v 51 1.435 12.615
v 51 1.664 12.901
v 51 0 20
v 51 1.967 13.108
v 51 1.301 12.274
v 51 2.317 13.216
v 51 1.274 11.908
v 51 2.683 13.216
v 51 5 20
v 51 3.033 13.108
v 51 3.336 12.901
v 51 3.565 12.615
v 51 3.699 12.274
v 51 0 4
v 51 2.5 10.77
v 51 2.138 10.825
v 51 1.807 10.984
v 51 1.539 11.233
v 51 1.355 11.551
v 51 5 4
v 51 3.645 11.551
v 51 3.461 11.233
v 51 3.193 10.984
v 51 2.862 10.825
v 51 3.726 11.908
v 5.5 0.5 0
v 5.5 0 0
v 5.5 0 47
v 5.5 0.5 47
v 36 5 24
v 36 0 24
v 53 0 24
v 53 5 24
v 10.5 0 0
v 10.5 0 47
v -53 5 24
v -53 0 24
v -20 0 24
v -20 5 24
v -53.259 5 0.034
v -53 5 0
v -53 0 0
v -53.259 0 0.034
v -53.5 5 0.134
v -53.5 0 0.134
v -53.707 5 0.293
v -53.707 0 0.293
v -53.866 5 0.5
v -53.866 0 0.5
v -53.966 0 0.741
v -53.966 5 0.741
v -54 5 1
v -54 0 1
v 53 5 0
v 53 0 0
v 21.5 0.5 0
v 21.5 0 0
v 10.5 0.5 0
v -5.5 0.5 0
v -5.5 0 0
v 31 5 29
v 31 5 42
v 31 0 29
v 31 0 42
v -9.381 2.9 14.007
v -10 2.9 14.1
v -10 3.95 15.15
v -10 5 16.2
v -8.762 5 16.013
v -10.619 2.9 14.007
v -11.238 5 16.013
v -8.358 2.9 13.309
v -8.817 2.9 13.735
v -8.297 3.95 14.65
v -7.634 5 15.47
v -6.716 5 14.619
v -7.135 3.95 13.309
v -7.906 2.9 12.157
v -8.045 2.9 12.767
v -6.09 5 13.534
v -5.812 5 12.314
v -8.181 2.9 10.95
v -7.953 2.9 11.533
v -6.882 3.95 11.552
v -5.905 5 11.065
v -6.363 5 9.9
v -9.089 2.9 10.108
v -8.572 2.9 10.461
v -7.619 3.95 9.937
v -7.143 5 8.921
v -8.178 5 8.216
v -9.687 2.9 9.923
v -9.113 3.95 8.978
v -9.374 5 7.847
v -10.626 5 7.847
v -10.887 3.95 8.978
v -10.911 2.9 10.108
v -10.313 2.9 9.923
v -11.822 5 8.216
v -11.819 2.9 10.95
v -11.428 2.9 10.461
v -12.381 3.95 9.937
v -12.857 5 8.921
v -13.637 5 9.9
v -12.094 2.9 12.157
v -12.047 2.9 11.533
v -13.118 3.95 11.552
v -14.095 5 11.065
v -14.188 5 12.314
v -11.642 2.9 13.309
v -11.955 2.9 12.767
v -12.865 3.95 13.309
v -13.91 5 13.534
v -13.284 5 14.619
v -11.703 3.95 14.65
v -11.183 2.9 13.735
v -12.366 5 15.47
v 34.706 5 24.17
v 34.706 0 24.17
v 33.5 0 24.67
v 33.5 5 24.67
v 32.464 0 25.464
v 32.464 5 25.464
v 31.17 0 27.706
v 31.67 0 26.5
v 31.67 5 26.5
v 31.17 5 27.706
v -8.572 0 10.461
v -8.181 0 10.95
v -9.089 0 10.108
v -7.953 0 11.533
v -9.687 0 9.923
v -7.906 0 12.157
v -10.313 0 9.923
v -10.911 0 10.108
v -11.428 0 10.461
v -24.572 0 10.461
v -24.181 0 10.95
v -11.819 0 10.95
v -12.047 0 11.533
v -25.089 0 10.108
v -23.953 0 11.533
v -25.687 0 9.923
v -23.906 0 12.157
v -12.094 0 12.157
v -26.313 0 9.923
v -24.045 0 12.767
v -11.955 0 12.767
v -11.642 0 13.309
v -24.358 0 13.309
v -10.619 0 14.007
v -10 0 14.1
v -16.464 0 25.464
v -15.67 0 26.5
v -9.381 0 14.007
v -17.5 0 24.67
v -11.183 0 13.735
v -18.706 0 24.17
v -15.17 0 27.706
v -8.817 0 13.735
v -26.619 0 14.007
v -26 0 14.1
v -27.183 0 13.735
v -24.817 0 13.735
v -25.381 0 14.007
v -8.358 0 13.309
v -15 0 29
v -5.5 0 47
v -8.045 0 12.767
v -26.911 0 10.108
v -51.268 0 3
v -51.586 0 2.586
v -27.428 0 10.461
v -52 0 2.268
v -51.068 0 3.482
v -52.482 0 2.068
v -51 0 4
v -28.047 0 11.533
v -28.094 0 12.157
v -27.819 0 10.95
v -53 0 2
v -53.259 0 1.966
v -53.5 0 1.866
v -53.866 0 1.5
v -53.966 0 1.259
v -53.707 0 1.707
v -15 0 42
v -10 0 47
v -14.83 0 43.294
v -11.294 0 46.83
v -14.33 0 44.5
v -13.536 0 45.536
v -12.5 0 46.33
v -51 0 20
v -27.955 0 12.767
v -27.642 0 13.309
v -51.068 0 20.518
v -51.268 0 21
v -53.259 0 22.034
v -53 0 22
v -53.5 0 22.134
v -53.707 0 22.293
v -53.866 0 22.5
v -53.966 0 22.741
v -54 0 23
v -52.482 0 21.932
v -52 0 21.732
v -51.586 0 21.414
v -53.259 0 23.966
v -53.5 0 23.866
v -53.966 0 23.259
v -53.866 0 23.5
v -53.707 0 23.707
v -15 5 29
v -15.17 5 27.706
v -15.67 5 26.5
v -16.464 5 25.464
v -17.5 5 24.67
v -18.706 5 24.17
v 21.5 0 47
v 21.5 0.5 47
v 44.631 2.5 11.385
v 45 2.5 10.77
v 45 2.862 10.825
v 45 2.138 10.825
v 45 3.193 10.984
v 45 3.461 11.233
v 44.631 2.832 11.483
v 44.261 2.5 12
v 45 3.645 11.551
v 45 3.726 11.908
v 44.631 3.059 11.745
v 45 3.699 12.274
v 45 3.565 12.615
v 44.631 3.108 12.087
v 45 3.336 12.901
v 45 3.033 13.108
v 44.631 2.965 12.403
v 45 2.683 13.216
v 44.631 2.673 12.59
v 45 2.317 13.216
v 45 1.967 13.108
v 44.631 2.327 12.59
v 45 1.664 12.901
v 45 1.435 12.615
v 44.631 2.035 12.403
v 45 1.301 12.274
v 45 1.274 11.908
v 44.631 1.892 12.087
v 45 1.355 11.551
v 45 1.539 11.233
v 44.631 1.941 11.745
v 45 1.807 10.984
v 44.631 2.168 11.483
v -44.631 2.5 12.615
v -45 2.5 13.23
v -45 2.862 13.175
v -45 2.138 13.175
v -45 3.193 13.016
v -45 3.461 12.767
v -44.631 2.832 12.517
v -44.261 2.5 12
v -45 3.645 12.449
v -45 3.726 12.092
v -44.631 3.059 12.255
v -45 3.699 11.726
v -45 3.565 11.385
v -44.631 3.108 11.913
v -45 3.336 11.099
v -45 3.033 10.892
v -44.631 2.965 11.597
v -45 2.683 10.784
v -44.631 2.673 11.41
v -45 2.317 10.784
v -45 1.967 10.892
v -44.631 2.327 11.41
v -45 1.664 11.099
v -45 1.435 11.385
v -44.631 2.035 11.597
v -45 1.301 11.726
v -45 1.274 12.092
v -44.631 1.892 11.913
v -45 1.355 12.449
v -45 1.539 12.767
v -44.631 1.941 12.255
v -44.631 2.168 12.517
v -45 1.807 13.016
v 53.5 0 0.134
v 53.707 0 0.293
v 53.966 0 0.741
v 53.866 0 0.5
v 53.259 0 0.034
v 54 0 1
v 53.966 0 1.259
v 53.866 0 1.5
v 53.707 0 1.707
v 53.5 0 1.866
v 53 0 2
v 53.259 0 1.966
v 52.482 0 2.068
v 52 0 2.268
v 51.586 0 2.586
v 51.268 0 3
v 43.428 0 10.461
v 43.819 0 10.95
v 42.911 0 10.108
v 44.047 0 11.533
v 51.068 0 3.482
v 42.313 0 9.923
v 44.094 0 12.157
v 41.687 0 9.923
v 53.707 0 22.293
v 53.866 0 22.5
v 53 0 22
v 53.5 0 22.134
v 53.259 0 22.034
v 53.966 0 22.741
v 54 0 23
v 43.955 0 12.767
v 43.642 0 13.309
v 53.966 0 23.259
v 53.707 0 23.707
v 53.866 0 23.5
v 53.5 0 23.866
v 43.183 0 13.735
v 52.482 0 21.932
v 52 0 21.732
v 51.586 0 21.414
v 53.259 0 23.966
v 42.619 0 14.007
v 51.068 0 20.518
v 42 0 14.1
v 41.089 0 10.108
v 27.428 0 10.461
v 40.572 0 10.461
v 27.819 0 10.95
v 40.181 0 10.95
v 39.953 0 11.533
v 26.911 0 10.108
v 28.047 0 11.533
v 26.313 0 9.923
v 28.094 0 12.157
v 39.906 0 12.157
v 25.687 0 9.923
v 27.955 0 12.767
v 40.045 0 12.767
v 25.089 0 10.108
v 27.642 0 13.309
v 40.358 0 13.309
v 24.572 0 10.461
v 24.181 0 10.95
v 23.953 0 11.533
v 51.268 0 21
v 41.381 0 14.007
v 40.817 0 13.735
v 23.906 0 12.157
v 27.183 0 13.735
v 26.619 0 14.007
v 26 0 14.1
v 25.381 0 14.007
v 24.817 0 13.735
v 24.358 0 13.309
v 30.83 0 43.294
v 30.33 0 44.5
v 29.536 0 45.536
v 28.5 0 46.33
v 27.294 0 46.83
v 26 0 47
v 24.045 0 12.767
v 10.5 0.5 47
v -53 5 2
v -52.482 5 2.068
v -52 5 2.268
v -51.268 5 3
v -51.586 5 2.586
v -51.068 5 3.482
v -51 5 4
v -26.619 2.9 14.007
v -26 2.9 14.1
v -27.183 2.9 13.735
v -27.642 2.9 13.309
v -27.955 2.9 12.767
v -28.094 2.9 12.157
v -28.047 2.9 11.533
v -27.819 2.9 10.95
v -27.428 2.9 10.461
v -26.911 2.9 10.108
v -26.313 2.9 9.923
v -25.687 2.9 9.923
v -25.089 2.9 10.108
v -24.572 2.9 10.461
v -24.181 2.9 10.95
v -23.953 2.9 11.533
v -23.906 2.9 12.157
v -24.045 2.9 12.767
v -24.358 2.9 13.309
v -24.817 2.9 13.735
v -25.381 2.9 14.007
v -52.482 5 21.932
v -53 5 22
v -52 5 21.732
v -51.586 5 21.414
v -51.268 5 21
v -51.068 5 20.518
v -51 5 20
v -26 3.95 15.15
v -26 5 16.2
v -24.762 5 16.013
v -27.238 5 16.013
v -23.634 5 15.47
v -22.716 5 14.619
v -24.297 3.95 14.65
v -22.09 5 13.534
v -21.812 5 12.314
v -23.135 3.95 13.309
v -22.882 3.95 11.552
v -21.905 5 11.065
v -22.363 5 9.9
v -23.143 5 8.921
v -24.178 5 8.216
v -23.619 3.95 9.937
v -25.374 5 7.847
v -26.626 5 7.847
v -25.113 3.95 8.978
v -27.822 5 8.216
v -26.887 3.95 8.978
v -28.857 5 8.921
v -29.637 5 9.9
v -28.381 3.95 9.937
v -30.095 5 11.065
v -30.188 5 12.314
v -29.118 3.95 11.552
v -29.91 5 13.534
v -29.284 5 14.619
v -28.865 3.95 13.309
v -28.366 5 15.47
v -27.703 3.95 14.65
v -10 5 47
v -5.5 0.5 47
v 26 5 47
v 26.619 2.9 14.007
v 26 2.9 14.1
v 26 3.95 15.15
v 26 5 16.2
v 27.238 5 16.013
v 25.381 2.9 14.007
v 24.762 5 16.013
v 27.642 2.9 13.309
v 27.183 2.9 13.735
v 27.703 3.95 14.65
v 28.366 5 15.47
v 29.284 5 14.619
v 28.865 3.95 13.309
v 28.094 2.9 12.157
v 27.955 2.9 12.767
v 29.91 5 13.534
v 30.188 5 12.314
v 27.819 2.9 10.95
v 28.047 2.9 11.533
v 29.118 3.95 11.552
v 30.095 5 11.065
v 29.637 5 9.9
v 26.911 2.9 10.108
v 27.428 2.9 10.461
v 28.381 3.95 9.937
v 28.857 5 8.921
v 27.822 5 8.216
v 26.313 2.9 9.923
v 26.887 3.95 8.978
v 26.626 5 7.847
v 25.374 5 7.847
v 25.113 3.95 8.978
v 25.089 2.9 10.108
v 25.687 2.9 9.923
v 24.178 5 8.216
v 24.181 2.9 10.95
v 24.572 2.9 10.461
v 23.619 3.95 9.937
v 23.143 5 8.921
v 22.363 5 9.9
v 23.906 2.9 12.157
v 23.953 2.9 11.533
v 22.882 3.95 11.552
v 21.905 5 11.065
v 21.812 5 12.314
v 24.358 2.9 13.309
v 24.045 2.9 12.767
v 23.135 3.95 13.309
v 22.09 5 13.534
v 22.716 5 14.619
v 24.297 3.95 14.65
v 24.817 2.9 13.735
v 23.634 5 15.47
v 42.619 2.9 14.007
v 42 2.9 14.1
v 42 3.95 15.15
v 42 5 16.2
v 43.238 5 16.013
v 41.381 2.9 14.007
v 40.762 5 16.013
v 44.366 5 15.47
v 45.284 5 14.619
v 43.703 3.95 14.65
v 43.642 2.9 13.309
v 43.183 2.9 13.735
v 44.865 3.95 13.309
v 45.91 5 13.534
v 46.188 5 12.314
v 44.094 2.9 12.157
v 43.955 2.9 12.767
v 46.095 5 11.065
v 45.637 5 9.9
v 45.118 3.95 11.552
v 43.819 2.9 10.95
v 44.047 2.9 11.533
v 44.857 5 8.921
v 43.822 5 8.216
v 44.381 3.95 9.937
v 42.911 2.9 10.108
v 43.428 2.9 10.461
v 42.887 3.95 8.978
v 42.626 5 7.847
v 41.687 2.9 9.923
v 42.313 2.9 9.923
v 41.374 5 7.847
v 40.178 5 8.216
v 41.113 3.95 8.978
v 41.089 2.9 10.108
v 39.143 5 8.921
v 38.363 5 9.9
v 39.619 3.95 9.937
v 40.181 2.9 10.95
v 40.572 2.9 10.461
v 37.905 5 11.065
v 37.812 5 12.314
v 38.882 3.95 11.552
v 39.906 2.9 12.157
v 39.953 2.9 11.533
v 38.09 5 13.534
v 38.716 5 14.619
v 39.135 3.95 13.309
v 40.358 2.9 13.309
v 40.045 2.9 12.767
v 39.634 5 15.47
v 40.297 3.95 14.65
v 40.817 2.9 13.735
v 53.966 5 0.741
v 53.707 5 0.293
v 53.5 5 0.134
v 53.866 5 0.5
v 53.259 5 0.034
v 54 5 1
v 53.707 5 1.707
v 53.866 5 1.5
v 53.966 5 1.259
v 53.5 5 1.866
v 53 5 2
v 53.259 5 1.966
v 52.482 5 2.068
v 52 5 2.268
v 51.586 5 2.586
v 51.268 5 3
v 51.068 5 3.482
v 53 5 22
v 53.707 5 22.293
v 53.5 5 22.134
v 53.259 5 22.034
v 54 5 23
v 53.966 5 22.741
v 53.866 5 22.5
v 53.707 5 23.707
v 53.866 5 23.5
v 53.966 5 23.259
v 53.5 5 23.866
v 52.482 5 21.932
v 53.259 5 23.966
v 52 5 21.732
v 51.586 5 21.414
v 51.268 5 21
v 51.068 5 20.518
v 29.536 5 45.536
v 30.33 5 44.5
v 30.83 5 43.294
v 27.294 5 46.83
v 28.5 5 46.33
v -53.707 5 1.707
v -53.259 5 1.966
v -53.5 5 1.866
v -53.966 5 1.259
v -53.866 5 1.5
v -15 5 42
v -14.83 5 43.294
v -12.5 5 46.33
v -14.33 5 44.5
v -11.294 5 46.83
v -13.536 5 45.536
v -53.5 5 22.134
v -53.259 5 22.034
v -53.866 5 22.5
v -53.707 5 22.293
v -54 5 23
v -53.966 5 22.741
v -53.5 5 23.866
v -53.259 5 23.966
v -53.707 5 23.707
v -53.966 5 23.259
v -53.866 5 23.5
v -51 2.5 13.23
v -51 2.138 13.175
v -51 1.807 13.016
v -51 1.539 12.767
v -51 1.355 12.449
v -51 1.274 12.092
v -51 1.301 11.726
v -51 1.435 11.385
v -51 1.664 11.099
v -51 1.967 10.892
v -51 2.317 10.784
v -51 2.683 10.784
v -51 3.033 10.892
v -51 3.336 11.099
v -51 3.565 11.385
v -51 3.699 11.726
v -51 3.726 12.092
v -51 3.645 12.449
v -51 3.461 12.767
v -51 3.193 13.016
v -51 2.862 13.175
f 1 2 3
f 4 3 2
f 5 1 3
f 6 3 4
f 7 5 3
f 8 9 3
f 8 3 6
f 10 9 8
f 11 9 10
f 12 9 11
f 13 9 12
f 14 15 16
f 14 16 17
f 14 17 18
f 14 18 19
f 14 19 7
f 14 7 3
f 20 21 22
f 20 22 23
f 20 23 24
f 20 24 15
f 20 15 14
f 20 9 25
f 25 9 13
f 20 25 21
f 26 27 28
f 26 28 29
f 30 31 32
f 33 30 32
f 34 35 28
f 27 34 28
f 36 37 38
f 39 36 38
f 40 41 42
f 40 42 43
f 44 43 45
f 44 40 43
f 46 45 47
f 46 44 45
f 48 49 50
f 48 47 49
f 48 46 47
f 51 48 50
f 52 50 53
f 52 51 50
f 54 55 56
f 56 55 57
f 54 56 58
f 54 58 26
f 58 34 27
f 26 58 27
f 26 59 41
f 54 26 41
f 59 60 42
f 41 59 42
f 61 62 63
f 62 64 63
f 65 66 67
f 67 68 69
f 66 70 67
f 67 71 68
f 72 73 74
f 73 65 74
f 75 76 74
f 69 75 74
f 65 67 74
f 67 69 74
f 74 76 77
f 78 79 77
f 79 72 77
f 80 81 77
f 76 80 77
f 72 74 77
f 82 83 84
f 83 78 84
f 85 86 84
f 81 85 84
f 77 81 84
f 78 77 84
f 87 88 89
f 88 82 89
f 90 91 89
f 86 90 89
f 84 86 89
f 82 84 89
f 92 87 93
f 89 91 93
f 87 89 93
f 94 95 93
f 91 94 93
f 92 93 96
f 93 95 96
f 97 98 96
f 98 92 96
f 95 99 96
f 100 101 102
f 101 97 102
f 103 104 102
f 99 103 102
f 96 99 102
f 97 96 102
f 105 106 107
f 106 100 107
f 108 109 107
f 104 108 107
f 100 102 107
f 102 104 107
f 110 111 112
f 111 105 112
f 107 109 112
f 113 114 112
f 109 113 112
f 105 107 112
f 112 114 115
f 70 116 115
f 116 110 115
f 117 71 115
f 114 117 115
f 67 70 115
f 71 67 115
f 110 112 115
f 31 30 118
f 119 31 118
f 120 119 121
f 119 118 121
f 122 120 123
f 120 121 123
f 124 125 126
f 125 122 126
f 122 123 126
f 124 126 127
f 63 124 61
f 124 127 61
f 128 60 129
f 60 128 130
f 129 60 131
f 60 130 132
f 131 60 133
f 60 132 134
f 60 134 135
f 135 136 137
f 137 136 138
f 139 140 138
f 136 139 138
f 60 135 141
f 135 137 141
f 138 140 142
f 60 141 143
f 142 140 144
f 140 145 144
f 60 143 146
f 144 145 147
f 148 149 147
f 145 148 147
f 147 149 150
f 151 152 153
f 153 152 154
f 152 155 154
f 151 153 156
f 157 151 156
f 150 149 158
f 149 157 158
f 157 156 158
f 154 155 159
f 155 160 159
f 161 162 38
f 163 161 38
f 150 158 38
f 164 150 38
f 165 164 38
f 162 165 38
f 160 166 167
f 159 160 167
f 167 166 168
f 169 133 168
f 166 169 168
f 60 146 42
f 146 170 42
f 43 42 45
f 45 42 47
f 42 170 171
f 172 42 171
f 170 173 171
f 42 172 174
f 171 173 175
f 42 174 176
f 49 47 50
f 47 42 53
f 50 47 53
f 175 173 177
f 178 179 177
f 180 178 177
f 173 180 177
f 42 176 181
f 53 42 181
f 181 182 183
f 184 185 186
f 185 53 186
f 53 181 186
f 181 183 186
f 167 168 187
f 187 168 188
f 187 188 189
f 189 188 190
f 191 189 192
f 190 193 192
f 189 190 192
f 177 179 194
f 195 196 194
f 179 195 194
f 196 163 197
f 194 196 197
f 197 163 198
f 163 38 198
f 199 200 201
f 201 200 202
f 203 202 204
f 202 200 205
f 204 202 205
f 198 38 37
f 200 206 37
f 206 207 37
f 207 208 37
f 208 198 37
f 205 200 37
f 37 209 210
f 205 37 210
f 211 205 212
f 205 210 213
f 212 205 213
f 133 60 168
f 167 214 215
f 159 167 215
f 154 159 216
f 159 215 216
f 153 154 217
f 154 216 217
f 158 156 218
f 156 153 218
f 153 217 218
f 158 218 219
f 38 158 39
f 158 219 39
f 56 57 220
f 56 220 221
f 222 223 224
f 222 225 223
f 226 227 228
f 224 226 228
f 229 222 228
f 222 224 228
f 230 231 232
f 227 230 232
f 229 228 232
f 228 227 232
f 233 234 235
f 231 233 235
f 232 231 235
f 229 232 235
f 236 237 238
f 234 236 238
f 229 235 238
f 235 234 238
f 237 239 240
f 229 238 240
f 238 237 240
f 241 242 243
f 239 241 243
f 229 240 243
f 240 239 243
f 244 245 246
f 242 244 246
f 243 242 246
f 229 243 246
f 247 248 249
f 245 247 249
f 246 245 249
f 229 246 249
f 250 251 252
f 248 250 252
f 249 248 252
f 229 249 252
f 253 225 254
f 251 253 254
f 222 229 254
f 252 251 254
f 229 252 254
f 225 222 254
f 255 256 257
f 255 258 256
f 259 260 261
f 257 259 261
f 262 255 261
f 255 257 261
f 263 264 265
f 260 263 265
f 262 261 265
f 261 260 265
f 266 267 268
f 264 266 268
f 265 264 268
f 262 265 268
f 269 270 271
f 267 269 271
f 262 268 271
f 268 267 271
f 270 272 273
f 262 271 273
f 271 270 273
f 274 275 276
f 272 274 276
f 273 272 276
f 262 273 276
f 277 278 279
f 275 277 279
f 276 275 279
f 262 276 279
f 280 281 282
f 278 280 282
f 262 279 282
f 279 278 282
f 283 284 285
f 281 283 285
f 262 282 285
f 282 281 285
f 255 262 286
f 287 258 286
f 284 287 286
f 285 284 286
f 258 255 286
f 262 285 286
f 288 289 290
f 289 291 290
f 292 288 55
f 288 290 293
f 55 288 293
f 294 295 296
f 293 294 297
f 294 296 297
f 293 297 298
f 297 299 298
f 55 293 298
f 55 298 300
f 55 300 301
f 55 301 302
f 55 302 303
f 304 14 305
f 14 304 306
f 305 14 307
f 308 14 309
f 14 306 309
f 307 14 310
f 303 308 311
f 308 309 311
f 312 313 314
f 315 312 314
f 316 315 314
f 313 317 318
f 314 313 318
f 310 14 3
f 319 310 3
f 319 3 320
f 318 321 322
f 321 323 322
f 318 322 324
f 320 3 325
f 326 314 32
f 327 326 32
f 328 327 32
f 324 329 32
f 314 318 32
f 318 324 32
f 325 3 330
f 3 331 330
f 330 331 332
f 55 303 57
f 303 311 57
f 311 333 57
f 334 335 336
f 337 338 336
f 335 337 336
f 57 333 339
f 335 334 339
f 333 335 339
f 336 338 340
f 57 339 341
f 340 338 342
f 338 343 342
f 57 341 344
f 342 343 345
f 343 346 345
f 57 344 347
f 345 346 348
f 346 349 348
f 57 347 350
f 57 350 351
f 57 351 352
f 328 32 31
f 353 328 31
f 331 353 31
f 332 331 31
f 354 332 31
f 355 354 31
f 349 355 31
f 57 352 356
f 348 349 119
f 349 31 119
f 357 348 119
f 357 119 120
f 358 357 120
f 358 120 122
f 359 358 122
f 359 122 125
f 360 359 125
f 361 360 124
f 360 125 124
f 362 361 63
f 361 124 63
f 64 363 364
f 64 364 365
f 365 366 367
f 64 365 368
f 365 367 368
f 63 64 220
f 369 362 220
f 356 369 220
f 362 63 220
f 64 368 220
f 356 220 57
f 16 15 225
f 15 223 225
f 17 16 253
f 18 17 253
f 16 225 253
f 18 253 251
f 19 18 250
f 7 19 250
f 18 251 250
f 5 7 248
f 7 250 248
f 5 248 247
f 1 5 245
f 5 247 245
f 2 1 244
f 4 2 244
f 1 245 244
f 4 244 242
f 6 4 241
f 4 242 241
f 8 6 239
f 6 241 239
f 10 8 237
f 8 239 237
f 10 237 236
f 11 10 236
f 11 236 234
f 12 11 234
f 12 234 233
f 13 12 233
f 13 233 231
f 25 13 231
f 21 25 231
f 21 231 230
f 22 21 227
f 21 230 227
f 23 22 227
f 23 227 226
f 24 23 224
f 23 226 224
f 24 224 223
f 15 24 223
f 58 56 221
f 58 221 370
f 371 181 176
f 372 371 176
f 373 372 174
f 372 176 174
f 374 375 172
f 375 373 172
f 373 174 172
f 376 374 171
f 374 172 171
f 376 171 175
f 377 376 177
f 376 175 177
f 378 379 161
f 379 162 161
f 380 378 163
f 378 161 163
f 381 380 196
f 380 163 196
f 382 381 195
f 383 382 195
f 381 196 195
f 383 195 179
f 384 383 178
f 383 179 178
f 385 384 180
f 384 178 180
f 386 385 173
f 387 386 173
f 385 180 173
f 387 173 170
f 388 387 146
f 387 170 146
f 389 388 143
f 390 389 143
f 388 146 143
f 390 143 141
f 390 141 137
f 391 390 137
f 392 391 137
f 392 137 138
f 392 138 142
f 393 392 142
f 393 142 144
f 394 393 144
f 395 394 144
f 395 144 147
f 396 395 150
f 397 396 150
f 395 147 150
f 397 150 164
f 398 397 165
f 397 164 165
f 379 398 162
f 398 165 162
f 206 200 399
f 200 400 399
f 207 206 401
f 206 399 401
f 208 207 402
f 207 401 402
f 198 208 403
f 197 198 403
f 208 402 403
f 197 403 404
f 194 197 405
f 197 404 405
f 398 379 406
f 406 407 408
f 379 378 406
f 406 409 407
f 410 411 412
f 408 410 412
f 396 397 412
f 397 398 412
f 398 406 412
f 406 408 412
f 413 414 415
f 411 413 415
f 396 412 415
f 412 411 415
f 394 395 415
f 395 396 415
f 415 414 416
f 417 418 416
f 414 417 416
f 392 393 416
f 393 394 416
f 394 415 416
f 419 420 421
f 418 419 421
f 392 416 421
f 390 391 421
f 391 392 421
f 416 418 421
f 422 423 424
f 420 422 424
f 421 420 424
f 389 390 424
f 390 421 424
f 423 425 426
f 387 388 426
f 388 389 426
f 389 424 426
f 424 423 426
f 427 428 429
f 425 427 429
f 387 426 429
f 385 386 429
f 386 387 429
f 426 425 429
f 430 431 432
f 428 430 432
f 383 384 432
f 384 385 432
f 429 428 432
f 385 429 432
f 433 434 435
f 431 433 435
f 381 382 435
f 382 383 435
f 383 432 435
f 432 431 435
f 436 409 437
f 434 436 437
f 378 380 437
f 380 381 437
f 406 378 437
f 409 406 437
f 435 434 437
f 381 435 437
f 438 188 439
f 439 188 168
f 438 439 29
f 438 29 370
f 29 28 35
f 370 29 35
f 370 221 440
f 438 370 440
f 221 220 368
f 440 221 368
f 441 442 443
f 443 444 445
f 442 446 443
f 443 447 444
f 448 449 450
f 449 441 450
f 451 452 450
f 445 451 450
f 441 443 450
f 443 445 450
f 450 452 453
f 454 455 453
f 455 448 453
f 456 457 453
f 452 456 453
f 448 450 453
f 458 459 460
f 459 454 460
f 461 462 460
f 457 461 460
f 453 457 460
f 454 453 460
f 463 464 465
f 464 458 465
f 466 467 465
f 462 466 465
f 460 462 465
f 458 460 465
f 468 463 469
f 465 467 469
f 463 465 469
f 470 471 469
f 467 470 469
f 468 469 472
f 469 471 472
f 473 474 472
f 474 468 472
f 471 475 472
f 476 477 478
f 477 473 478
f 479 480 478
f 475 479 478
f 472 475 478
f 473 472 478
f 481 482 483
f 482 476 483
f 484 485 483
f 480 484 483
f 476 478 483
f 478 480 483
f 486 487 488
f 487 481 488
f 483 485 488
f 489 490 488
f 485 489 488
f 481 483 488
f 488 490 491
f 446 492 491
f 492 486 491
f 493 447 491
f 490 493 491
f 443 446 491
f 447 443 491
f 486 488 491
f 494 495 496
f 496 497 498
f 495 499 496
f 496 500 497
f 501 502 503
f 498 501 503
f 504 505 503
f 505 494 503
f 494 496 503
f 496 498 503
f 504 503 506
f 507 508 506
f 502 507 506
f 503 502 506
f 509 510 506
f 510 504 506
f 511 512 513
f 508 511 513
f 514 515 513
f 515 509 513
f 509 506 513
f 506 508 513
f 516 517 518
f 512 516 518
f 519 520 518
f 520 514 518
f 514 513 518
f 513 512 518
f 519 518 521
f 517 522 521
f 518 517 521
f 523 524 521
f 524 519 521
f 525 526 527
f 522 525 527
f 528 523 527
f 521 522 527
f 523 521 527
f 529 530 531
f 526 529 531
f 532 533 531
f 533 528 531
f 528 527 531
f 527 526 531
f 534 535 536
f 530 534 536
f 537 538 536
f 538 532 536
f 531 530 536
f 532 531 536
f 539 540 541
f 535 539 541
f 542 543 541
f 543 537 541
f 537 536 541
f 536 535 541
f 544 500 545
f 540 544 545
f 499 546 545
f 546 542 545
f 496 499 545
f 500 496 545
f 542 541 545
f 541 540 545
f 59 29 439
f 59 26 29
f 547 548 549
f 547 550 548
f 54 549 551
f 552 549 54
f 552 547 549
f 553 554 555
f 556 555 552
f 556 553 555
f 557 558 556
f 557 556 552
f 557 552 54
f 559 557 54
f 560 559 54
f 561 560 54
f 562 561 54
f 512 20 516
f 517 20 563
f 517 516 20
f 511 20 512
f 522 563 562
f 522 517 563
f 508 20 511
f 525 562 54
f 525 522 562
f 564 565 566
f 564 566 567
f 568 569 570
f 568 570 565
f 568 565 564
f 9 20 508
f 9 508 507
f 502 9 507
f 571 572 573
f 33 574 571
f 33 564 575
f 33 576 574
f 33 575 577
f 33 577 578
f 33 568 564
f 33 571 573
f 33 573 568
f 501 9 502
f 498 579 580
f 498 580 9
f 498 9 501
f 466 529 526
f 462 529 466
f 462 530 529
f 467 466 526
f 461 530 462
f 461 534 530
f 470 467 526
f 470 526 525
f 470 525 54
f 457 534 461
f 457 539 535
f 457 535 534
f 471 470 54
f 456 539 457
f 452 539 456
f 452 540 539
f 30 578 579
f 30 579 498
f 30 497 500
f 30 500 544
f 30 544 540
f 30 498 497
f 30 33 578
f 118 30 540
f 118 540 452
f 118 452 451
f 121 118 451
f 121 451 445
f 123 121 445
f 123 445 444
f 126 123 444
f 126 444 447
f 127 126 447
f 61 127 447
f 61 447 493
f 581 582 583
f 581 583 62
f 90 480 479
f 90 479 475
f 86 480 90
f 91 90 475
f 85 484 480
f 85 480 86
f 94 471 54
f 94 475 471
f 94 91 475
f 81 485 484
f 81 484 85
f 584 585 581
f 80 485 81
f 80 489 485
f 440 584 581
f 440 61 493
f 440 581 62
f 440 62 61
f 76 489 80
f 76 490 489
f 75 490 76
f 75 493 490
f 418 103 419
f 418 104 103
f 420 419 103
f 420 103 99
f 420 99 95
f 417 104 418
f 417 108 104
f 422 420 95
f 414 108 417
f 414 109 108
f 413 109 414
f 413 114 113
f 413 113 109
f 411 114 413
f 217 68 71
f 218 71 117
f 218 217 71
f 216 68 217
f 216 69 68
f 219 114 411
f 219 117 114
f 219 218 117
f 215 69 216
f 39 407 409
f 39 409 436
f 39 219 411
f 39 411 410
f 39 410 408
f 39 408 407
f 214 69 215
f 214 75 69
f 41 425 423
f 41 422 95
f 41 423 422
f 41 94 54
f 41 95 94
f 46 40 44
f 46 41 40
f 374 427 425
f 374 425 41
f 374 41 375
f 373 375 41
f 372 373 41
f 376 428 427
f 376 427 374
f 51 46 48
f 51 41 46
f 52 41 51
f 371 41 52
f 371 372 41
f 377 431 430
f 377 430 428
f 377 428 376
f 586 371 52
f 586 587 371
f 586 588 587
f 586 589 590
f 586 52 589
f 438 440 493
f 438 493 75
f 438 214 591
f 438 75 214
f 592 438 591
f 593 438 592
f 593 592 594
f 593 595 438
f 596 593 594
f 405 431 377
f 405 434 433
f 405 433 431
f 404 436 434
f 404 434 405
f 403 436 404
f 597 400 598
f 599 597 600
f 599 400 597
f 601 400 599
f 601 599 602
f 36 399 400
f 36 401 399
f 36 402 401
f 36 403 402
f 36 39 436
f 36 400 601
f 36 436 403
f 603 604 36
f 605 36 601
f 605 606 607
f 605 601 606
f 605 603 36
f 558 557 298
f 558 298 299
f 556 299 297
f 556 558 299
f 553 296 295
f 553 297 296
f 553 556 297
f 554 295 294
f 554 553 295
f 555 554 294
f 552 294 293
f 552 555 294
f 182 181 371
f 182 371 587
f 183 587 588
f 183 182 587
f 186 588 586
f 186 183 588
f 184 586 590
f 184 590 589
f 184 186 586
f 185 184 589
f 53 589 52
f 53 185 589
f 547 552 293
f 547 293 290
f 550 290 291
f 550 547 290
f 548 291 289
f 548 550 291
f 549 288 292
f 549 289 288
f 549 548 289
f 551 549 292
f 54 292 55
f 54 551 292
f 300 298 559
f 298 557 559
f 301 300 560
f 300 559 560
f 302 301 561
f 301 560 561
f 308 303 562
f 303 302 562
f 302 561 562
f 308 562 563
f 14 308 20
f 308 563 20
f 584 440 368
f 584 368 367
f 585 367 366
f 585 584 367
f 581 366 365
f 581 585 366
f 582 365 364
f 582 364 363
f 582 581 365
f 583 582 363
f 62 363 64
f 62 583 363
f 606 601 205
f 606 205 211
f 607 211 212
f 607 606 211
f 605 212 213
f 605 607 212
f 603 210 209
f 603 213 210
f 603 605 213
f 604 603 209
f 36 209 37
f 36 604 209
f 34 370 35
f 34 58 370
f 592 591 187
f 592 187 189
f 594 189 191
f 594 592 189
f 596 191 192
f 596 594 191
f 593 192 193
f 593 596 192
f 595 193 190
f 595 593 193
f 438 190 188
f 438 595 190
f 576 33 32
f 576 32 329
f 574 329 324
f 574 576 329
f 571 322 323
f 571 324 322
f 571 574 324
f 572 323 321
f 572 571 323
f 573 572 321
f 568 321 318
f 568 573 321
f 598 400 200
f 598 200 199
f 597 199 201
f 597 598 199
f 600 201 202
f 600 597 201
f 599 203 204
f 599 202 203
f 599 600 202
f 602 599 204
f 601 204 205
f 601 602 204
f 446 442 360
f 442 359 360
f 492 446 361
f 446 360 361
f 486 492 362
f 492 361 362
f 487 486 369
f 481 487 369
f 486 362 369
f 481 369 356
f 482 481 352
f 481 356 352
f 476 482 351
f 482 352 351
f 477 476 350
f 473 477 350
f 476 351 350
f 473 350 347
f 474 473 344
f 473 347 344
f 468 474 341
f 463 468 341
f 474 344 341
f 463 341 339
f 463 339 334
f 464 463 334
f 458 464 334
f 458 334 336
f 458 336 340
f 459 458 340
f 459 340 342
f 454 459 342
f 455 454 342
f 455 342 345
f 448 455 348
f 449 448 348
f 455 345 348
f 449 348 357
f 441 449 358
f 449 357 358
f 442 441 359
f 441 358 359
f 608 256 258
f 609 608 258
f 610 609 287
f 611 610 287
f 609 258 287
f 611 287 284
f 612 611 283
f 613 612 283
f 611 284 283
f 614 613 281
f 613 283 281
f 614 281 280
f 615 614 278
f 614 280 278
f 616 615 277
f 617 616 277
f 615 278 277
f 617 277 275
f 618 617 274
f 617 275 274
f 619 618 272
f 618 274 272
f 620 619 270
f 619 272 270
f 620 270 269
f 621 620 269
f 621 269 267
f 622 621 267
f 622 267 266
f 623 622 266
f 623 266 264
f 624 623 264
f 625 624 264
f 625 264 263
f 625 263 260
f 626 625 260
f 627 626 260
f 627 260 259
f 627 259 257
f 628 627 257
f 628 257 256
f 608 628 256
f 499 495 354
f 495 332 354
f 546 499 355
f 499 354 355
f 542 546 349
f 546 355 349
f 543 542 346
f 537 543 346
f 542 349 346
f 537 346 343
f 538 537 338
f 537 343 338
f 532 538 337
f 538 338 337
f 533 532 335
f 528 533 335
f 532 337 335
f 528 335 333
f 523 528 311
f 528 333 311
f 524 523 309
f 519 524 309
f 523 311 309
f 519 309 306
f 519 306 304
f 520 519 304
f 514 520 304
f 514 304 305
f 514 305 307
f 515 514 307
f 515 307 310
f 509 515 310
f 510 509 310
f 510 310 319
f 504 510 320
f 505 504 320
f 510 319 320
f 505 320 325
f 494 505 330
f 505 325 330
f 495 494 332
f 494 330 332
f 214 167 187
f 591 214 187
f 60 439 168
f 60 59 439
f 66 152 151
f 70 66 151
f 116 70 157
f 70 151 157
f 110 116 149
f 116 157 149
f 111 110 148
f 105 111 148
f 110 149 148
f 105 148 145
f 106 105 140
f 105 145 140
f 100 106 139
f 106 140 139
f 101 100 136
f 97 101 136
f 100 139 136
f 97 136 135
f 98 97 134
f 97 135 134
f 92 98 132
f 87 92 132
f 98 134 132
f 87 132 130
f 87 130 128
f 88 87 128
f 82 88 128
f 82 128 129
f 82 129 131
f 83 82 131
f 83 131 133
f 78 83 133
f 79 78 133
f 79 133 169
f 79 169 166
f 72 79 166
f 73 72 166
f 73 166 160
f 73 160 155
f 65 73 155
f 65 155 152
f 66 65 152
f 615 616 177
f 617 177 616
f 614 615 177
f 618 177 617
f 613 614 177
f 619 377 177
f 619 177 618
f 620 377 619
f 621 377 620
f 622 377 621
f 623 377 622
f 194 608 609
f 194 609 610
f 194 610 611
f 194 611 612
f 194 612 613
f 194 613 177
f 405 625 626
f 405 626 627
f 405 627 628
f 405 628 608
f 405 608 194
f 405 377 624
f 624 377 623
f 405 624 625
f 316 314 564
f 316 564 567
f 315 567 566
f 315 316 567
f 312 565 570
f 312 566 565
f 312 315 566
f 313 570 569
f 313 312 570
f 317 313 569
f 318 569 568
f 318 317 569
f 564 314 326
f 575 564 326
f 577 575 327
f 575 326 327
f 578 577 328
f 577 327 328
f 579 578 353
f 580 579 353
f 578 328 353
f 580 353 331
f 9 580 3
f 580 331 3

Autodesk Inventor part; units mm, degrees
ref_plane "YZ Plane" through (0, 0, 0) normal (1, 0, 0) x (0, 1, 0)
ref_plane "XZ Plane" through (0, 0, 0) normal (0, 1, 0) x (-1, 0, 0)
sketch "Skizze1" plane through (0, 0, 0) normal (0, 1, 0) x (-1, 0, 0)
  line L0 (-54, 0) -> (54, 0)
  line L1 (54, 0) -> (54, 24)
  line L2 (54, 24) -> (15, 24)
  line L3 (15, 24) -> (15, 47)
  line L4 (15, 47) -> (-31, 47)
  line L5 (-31, 47) -> (-31, 24)
  line L6 (-31, 24) -> (-54, 24)
  line L7 (-54, 24) -> (-54, 0)
  point P0 (0, 0)
  point P1 (0, 0)
  dimension "d0" = 108
  dimension "d1" = 24
  dimension "d2" = 39
  dimension "d3" = 23
  dimension "d59" = 23
extrude "Extrusion1" add sketch "Skizze1" along normal blind 5
sketch "Skizze2" plane through (54, 0, 24) normal (1, 0, 0) x (0, 0, -1)
  line L0 (0, 0) -> (24, 0) projected
  line L1 (24, 0) -> (24, 5) projected
  line L2 (0, 5) -> (24, 5) projected
  line L3 (0, 0) -> (0, 5) projected
  line L4 (2, 0) -> (22, 0)
  line L5 (22, 0) -> (22, 5)
  line L6 (22, 5) -> (2, 5)
  line L7 (2, 5) -> (2, 0)
  dimension "d7" = 2
  dimension "d8" = 2
extrude "Extrusion2" cut sketch "Skizze2" against normal blind 3 contours L7 L2 L5 L0
sketch "Skizze3" plane through (-54, 0, 0) normal (-1, 0, 0) x (0, 0, 1)
  line L0 (0, 0) -> (24, 0) projected
  line L1 (24, 0) -> (24, 5) projected
  line L2 (0, 5) -> (24, 5) projected
  line L3 (0, 0) -> (0, 5) projected
  line L4 (2, 0) -> (22, 0)
  line L5 (22, 0) -> (22, 5)
  line L6 (22, 5) -> (2, 5)
  line L7 (2, 5) -> (2, 0)
  dimension "d11" = 2
  dimension "d12" = 2
extrude "Extrusion3" cut sketch "Skizze3" against normal blind 3 contours L7 L2 L5 L0
fillet "Rundung1" radius 1 8 edges at (-54, 2.5, 0) (-54, 2.5, 2) (-54, 2.5, 22) (-54, 2.5, 24) (54, 2.5, 24) (54, 2.5, 22) (54, 2.5, 2) (54, 2.5, 0)
fillet "Rundung2" radius 5 4 edges at (31, 2.5, 24) (31, 2.5, 47) (-15, 2.5, 47) (-15, 2.5, 24)
sketch "Skizze4" plane through (53, 0, 0) normal (0, 0, -1) x (-1, 0, 0)
  line L0 (58.5, -0.5) -> (47.5, -0.5)
  line L1 (47.5, -0.5) -> (47.5, 0.5)
  line L2 (47.5, 0.5) -> (58.5, 0.5)
  line L3 (58.5, 0.5) -> (58.5, -0.5)
  line L4 (58.5, -0.5) -> (47.5, 0.5) construction
  line L5 (47.5, -0.5) -> (58.5, 0.5) construction
  point P0 (53, 0)
  dimension "d17" = 11
  dimension "d18" = 1
extrude "Extrusion4" cut sketch "Skizze4" against normal through all
sketch "Skizze6" plane through (0, 5, 0) normal (0, 1, 0) x (1, 0, 0)
  line L0 (53, 0) -> (-53, 0) projected
  point P0 (0, 0)
  point P1 (-26, -12)
  point P2 (26, -12)
  dimension "d31" = 12
  dimension "d32" = 26
  dimension "d33" = 26
hole "Bohrung2" at (-26, 5, 12) at (26, 5, 12) direction (0, -1, 0) diameter 4.2 end through all countersink diameter 8.4 countersink angle 90
sketch "Skizze7" plane through (51, 0, 24) normal (1, 0, 0) x (0, 0, -1)
  line L0 (22, 5) -> (22, 0) projected
  line L1 (2, 5) -> (22, 5) projected
  point P0 (24, 0)
  point P1 (12, 2.5)
  dimension "d41" = 2.5
  dimension "d42" = 10
hole "Bohrung3" at (51, 2.5, 12) direction (-1, 0, 0) diameter 2.459 depth 6 tip angle 118 thread size "M3x0.5" class "6H" standard "ANSI Metric M Profile"
sketch "Skizze8" plane through (-51, 0, 0) normal (-1, 0, 0) x (0, 0, 1)
  line L0 (2, 5) -> (22, 5) projected
  line L1 (2, 0) -> (2, 5) projected
  point P0 (0, 0)
  point P1 (12, 2.5)
  dimension "d50" = 2.5
  dimension "d51" = 10
hole "Bohrung4" at (-51, 2.5, 12) direction (1, 0, 0) diameter 2.459 depth 6 tip angle 118 thread size "M3x0.5" class "6H" standard "ANSI Metric M Profile"
ref_plane "Arbeitsebene1" through (-51, 0, 12) normal (0, 0, -1) x (-1, 0, 0)
pattern_linear "Rechteckige Anordnung1" count 2 spacing 16 along (1, 0, 0) of "Extrusion4", "Bohrung2"
fillet "Rundung3" radius 2 4 edges at (51, 2.5, 22) (51, 2.5, 2) (-51, 2.5, 22) (-51, 2.5, 2)
properties part number "GrundplatteeThumbloop"
